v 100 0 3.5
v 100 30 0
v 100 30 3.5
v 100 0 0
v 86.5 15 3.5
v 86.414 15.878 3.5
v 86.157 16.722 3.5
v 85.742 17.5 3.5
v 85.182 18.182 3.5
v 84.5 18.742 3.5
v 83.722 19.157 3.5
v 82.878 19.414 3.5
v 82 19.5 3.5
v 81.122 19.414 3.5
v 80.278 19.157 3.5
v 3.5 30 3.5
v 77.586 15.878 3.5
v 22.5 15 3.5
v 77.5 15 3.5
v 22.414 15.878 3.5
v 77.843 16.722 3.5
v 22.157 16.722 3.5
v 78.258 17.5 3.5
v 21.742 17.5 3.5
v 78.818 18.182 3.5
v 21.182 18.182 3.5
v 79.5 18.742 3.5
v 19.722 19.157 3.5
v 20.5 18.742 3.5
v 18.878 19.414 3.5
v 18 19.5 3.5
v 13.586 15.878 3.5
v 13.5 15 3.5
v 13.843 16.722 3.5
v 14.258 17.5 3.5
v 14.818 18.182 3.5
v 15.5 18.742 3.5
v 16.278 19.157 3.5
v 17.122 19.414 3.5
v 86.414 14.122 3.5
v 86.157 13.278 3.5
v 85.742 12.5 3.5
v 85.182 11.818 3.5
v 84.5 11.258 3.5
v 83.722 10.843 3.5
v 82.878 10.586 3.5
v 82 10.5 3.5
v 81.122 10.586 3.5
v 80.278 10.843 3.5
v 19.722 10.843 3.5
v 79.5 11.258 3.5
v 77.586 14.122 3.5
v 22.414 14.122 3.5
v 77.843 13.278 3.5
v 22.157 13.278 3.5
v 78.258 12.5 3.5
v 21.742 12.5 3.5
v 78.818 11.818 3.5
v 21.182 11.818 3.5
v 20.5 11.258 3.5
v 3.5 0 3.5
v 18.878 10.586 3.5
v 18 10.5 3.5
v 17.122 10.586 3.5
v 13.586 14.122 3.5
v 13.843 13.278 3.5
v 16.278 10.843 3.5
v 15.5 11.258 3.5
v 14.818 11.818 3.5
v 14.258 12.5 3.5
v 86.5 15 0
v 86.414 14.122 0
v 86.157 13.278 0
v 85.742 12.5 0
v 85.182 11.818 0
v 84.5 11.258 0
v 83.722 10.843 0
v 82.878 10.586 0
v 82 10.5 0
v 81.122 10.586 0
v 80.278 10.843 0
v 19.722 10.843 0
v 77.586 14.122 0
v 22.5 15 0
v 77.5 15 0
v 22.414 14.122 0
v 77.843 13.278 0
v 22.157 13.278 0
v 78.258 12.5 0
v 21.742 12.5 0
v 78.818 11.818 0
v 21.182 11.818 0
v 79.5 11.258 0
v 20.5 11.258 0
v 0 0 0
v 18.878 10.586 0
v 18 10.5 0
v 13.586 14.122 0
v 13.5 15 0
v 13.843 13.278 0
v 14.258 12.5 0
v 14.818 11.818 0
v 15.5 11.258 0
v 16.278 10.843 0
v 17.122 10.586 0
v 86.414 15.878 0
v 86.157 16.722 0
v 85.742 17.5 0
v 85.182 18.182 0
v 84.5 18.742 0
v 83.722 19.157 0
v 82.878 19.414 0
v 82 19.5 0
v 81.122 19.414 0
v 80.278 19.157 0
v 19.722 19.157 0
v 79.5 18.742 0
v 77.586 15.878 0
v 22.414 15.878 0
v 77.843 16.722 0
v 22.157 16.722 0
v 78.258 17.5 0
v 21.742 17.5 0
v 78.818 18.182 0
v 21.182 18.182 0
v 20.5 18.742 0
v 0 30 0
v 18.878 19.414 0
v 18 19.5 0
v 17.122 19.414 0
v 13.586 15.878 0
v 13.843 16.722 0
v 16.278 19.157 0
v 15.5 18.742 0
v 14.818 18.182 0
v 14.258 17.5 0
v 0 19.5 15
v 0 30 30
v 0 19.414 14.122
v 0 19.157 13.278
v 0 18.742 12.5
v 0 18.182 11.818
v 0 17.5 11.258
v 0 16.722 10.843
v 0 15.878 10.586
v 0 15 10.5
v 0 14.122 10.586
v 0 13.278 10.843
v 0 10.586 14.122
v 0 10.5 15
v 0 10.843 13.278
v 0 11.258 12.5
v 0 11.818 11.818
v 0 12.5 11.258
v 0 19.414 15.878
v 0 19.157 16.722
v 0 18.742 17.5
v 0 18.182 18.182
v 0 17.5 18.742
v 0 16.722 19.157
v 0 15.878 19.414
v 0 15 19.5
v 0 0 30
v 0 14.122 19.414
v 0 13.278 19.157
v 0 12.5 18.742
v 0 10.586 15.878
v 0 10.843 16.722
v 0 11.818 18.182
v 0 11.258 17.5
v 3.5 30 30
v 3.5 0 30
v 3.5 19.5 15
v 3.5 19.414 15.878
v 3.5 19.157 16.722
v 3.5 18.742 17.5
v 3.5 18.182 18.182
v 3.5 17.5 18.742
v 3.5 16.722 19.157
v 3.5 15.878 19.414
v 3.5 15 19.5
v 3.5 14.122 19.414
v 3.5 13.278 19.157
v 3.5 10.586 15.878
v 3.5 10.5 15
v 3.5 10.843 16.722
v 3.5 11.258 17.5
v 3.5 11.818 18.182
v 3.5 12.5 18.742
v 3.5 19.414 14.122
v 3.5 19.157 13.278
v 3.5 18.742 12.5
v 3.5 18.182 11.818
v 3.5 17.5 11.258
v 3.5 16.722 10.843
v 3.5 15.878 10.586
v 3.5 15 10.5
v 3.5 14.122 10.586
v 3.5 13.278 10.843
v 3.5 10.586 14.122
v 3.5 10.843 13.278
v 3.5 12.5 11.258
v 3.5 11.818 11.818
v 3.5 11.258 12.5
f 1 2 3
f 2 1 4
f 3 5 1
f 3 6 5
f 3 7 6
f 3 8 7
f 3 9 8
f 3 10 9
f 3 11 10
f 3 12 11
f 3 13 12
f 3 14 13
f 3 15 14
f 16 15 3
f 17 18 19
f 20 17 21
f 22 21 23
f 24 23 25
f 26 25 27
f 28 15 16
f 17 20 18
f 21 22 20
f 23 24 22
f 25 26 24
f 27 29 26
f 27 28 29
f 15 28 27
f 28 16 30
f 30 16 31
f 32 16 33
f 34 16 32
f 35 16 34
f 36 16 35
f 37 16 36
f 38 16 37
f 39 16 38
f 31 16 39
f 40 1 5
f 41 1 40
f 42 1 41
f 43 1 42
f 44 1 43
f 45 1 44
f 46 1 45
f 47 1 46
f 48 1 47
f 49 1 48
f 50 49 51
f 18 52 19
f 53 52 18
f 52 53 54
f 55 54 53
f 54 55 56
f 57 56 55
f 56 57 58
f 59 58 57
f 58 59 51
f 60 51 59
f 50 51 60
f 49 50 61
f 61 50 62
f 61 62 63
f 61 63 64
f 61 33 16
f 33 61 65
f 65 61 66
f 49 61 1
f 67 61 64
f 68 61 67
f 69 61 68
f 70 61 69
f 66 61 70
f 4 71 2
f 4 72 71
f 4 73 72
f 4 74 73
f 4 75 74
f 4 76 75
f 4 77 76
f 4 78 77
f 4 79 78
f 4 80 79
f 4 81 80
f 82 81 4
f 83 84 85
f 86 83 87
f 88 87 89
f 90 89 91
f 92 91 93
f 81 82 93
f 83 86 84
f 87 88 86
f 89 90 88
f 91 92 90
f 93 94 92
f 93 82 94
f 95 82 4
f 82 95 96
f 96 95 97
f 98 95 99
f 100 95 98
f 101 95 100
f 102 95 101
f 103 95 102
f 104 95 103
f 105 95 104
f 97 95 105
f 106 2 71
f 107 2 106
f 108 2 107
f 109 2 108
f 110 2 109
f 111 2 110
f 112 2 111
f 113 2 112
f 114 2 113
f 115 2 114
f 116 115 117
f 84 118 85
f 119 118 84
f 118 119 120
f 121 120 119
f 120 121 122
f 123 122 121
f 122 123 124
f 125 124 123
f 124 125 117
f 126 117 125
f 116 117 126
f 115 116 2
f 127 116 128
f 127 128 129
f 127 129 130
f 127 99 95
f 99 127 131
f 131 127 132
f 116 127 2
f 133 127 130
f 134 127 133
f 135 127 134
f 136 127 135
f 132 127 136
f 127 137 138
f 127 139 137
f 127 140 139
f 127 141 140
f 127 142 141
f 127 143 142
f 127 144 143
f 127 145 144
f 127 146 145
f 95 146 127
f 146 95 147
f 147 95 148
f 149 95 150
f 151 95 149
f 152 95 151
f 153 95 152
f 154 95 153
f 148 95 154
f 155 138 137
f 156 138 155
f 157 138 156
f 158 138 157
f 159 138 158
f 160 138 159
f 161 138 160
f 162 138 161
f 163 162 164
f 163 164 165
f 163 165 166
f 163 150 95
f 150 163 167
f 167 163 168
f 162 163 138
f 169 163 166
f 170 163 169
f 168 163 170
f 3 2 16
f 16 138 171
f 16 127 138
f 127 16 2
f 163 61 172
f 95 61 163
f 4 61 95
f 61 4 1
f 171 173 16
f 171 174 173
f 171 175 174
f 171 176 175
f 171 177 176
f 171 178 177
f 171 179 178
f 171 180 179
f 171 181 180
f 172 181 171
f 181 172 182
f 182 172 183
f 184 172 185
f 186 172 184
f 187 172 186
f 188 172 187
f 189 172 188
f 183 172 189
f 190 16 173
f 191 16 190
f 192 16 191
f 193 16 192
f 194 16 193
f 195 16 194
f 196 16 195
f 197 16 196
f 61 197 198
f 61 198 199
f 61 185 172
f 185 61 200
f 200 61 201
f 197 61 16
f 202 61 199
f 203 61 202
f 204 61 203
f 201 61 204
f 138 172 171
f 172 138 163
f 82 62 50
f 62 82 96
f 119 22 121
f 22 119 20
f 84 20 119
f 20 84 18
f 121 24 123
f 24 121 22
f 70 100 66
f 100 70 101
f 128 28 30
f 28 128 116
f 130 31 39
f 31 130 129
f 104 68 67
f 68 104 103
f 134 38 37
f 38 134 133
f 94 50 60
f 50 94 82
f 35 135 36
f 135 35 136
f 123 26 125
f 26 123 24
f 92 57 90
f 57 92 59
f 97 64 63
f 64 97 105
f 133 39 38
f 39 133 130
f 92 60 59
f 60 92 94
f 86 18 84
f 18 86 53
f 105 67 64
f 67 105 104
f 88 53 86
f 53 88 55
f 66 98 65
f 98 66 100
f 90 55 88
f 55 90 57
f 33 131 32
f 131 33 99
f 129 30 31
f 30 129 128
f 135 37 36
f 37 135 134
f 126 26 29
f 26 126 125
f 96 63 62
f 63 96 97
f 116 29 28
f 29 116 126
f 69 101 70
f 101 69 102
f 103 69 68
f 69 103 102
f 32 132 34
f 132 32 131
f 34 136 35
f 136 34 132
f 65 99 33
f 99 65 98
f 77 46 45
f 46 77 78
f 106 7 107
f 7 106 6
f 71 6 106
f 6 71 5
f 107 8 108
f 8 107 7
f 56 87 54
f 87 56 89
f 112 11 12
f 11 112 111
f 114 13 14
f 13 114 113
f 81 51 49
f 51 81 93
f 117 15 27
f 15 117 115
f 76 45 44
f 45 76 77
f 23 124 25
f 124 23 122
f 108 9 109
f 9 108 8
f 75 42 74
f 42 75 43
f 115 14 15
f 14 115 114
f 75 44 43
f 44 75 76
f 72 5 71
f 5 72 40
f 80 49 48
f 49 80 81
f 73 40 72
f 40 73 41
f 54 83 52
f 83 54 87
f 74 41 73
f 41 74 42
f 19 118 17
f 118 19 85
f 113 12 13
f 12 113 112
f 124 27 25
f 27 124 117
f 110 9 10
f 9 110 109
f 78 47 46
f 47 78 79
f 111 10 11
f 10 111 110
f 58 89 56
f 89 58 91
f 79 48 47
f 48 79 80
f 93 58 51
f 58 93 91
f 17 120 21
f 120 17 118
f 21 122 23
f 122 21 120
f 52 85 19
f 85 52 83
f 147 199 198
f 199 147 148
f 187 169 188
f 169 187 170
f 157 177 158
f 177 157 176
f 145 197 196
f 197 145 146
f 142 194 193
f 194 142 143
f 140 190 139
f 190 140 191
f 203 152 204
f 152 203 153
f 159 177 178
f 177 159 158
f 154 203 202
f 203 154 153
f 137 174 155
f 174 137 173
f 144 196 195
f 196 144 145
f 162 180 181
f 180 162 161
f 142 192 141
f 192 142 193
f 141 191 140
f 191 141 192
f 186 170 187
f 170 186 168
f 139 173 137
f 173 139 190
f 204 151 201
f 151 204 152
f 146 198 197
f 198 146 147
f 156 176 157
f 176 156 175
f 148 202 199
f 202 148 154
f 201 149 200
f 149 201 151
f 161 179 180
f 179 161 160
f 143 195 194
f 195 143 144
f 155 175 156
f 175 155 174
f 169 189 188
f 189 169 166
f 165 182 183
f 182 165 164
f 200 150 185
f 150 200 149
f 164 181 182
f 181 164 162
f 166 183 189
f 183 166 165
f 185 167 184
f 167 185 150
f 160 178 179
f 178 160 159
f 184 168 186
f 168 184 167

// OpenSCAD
$fn = 32;

// ----------------------------------------------------------------------
// L-bracket: 100 x 30 x 30 mm
// ----------------------------------------------------------------------

// --- parameters (mm) ---
run_out = 100;            // horizontal leg, X
rise = 30;                // vertical leg, Z
bracket_w = 30;           // bracket depth, Y
sheet_t = 3.5;            // plate thickness
hole_d = 9;               // clearance for M8

module hole_z(px, py) {
  translate([px, py, -2.5]) cylinder(h = sheet_t + 5, d = hole_d);
}
module hole_x(pz, py) {
  translate([-2.5, py, pz]) rotate([0, 90, 0]) cylinder(h = sheet_t + 5, d = hole_d);
}

difference() {
  union() {
    /* horizontal leg */
    cube([run_out, bracket_w, sheet_t]);
    /* vertical leg, overlapping the corner block */
    cube([sheet_t, bracket_w, rise]);
  }
  hole_z(18, 15);
  hole_z(82, 15);
  hole_x(15, 15);
}
